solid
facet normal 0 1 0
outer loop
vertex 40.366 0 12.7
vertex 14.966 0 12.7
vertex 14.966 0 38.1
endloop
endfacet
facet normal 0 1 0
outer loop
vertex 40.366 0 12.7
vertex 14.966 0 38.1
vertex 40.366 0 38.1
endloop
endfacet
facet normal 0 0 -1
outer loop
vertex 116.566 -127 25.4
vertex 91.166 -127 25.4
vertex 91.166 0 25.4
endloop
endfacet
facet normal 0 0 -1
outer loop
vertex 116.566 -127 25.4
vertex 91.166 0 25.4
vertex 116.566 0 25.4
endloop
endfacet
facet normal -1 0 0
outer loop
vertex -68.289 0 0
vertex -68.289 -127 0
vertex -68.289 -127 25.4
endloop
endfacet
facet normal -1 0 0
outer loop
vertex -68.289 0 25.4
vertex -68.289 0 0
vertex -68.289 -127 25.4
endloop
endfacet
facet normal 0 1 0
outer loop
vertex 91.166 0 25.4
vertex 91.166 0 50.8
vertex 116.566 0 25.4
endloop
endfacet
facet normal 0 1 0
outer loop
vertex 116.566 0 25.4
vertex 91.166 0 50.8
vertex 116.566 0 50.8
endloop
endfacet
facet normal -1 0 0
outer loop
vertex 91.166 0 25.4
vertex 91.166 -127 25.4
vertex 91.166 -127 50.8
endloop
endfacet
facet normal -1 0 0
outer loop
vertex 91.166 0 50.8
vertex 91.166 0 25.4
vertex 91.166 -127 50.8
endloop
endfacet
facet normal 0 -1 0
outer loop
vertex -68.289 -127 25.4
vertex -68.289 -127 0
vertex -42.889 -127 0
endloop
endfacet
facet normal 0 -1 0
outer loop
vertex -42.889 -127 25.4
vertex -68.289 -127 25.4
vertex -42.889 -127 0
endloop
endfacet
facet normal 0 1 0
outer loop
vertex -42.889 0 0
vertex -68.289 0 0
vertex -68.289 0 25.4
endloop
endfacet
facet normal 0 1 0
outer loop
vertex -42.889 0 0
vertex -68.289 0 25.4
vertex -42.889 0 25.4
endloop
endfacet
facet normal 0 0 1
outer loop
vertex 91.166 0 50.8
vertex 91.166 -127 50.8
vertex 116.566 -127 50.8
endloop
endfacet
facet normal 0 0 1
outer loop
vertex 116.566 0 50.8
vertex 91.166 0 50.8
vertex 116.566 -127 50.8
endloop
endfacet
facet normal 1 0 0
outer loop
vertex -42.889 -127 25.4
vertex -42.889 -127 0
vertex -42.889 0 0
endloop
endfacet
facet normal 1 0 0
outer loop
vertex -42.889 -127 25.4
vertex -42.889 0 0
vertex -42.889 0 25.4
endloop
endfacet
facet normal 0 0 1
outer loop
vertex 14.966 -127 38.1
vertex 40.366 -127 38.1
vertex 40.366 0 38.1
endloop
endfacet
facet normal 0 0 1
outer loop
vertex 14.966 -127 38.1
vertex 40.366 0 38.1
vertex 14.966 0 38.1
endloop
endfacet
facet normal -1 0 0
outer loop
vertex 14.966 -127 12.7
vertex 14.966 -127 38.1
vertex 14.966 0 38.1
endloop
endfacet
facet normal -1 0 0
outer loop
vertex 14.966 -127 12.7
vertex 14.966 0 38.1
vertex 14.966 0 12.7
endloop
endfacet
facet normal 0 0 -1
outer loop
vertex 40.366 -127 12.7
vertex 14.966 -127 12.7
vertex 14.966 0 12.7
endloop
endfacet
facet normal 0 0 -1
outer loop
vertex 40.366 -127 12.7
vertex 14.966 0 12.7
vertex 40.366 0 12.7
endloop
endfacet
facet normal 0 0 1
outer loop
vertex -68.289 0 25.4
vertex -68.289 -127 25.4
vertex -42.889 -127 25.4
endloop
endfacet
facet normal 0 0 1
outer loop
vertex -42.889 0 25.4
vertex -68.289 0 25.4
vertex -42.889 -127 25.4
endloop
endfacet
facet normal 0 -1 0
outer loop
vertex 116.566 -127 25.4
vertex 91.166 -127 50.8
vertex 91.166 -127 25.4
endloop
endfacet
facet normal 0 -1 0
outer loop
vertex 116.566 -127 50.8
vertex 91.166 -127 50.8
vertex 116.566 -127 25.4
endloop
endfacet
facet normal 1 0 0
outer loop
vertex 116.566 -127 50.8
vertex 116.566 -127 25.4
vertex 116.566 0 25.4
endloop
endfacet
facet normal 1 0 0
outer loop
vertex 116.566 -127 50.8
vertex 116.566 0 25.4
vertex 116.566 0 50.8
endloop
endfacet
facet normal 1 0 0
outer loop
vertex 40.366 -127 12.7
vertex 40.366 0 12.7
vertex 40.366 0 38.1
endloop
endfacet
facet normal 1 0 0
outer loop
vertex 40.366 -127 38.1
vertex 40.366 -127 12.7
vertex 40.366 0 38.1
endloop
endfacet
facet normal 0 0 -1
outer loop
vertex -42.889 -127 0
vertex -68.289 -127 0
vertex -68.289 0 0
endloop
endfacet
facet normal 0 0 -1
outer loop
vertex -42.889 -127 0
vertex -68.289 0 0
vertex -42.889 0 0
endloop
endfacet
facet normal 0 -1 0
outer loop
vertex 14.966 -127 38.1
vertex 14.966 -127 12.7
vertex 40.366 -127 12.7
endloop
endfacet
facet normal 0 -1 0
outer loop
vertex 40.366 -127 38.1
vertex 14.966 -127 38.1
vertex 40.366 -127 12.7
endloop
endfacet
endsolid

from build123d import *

# Parameters (mm, degrees)
F0_W     = 25.4
F0_H     = 25.4
F1_DEPTH = 127


with BuildPart() as f1:
    # F0 (on Front) → F1 (new body)
    with BuildSketch(Plane.XZ):
        with Locations((-55.588986, 12.7)):
            Rectangle(F0_W, F0_H)
        Polygon((14.965562, 38.1), (14.965562, 12.7), (40.365562, 12.7), (40.365562, 25.4), (40.365562, 38.1), align=None)
        with Locations((103.865562, 38.1)):
            Rectangle(F0_W, F0_H)
    extrude(amount=F1_DEPTH)


solid = f1.part
